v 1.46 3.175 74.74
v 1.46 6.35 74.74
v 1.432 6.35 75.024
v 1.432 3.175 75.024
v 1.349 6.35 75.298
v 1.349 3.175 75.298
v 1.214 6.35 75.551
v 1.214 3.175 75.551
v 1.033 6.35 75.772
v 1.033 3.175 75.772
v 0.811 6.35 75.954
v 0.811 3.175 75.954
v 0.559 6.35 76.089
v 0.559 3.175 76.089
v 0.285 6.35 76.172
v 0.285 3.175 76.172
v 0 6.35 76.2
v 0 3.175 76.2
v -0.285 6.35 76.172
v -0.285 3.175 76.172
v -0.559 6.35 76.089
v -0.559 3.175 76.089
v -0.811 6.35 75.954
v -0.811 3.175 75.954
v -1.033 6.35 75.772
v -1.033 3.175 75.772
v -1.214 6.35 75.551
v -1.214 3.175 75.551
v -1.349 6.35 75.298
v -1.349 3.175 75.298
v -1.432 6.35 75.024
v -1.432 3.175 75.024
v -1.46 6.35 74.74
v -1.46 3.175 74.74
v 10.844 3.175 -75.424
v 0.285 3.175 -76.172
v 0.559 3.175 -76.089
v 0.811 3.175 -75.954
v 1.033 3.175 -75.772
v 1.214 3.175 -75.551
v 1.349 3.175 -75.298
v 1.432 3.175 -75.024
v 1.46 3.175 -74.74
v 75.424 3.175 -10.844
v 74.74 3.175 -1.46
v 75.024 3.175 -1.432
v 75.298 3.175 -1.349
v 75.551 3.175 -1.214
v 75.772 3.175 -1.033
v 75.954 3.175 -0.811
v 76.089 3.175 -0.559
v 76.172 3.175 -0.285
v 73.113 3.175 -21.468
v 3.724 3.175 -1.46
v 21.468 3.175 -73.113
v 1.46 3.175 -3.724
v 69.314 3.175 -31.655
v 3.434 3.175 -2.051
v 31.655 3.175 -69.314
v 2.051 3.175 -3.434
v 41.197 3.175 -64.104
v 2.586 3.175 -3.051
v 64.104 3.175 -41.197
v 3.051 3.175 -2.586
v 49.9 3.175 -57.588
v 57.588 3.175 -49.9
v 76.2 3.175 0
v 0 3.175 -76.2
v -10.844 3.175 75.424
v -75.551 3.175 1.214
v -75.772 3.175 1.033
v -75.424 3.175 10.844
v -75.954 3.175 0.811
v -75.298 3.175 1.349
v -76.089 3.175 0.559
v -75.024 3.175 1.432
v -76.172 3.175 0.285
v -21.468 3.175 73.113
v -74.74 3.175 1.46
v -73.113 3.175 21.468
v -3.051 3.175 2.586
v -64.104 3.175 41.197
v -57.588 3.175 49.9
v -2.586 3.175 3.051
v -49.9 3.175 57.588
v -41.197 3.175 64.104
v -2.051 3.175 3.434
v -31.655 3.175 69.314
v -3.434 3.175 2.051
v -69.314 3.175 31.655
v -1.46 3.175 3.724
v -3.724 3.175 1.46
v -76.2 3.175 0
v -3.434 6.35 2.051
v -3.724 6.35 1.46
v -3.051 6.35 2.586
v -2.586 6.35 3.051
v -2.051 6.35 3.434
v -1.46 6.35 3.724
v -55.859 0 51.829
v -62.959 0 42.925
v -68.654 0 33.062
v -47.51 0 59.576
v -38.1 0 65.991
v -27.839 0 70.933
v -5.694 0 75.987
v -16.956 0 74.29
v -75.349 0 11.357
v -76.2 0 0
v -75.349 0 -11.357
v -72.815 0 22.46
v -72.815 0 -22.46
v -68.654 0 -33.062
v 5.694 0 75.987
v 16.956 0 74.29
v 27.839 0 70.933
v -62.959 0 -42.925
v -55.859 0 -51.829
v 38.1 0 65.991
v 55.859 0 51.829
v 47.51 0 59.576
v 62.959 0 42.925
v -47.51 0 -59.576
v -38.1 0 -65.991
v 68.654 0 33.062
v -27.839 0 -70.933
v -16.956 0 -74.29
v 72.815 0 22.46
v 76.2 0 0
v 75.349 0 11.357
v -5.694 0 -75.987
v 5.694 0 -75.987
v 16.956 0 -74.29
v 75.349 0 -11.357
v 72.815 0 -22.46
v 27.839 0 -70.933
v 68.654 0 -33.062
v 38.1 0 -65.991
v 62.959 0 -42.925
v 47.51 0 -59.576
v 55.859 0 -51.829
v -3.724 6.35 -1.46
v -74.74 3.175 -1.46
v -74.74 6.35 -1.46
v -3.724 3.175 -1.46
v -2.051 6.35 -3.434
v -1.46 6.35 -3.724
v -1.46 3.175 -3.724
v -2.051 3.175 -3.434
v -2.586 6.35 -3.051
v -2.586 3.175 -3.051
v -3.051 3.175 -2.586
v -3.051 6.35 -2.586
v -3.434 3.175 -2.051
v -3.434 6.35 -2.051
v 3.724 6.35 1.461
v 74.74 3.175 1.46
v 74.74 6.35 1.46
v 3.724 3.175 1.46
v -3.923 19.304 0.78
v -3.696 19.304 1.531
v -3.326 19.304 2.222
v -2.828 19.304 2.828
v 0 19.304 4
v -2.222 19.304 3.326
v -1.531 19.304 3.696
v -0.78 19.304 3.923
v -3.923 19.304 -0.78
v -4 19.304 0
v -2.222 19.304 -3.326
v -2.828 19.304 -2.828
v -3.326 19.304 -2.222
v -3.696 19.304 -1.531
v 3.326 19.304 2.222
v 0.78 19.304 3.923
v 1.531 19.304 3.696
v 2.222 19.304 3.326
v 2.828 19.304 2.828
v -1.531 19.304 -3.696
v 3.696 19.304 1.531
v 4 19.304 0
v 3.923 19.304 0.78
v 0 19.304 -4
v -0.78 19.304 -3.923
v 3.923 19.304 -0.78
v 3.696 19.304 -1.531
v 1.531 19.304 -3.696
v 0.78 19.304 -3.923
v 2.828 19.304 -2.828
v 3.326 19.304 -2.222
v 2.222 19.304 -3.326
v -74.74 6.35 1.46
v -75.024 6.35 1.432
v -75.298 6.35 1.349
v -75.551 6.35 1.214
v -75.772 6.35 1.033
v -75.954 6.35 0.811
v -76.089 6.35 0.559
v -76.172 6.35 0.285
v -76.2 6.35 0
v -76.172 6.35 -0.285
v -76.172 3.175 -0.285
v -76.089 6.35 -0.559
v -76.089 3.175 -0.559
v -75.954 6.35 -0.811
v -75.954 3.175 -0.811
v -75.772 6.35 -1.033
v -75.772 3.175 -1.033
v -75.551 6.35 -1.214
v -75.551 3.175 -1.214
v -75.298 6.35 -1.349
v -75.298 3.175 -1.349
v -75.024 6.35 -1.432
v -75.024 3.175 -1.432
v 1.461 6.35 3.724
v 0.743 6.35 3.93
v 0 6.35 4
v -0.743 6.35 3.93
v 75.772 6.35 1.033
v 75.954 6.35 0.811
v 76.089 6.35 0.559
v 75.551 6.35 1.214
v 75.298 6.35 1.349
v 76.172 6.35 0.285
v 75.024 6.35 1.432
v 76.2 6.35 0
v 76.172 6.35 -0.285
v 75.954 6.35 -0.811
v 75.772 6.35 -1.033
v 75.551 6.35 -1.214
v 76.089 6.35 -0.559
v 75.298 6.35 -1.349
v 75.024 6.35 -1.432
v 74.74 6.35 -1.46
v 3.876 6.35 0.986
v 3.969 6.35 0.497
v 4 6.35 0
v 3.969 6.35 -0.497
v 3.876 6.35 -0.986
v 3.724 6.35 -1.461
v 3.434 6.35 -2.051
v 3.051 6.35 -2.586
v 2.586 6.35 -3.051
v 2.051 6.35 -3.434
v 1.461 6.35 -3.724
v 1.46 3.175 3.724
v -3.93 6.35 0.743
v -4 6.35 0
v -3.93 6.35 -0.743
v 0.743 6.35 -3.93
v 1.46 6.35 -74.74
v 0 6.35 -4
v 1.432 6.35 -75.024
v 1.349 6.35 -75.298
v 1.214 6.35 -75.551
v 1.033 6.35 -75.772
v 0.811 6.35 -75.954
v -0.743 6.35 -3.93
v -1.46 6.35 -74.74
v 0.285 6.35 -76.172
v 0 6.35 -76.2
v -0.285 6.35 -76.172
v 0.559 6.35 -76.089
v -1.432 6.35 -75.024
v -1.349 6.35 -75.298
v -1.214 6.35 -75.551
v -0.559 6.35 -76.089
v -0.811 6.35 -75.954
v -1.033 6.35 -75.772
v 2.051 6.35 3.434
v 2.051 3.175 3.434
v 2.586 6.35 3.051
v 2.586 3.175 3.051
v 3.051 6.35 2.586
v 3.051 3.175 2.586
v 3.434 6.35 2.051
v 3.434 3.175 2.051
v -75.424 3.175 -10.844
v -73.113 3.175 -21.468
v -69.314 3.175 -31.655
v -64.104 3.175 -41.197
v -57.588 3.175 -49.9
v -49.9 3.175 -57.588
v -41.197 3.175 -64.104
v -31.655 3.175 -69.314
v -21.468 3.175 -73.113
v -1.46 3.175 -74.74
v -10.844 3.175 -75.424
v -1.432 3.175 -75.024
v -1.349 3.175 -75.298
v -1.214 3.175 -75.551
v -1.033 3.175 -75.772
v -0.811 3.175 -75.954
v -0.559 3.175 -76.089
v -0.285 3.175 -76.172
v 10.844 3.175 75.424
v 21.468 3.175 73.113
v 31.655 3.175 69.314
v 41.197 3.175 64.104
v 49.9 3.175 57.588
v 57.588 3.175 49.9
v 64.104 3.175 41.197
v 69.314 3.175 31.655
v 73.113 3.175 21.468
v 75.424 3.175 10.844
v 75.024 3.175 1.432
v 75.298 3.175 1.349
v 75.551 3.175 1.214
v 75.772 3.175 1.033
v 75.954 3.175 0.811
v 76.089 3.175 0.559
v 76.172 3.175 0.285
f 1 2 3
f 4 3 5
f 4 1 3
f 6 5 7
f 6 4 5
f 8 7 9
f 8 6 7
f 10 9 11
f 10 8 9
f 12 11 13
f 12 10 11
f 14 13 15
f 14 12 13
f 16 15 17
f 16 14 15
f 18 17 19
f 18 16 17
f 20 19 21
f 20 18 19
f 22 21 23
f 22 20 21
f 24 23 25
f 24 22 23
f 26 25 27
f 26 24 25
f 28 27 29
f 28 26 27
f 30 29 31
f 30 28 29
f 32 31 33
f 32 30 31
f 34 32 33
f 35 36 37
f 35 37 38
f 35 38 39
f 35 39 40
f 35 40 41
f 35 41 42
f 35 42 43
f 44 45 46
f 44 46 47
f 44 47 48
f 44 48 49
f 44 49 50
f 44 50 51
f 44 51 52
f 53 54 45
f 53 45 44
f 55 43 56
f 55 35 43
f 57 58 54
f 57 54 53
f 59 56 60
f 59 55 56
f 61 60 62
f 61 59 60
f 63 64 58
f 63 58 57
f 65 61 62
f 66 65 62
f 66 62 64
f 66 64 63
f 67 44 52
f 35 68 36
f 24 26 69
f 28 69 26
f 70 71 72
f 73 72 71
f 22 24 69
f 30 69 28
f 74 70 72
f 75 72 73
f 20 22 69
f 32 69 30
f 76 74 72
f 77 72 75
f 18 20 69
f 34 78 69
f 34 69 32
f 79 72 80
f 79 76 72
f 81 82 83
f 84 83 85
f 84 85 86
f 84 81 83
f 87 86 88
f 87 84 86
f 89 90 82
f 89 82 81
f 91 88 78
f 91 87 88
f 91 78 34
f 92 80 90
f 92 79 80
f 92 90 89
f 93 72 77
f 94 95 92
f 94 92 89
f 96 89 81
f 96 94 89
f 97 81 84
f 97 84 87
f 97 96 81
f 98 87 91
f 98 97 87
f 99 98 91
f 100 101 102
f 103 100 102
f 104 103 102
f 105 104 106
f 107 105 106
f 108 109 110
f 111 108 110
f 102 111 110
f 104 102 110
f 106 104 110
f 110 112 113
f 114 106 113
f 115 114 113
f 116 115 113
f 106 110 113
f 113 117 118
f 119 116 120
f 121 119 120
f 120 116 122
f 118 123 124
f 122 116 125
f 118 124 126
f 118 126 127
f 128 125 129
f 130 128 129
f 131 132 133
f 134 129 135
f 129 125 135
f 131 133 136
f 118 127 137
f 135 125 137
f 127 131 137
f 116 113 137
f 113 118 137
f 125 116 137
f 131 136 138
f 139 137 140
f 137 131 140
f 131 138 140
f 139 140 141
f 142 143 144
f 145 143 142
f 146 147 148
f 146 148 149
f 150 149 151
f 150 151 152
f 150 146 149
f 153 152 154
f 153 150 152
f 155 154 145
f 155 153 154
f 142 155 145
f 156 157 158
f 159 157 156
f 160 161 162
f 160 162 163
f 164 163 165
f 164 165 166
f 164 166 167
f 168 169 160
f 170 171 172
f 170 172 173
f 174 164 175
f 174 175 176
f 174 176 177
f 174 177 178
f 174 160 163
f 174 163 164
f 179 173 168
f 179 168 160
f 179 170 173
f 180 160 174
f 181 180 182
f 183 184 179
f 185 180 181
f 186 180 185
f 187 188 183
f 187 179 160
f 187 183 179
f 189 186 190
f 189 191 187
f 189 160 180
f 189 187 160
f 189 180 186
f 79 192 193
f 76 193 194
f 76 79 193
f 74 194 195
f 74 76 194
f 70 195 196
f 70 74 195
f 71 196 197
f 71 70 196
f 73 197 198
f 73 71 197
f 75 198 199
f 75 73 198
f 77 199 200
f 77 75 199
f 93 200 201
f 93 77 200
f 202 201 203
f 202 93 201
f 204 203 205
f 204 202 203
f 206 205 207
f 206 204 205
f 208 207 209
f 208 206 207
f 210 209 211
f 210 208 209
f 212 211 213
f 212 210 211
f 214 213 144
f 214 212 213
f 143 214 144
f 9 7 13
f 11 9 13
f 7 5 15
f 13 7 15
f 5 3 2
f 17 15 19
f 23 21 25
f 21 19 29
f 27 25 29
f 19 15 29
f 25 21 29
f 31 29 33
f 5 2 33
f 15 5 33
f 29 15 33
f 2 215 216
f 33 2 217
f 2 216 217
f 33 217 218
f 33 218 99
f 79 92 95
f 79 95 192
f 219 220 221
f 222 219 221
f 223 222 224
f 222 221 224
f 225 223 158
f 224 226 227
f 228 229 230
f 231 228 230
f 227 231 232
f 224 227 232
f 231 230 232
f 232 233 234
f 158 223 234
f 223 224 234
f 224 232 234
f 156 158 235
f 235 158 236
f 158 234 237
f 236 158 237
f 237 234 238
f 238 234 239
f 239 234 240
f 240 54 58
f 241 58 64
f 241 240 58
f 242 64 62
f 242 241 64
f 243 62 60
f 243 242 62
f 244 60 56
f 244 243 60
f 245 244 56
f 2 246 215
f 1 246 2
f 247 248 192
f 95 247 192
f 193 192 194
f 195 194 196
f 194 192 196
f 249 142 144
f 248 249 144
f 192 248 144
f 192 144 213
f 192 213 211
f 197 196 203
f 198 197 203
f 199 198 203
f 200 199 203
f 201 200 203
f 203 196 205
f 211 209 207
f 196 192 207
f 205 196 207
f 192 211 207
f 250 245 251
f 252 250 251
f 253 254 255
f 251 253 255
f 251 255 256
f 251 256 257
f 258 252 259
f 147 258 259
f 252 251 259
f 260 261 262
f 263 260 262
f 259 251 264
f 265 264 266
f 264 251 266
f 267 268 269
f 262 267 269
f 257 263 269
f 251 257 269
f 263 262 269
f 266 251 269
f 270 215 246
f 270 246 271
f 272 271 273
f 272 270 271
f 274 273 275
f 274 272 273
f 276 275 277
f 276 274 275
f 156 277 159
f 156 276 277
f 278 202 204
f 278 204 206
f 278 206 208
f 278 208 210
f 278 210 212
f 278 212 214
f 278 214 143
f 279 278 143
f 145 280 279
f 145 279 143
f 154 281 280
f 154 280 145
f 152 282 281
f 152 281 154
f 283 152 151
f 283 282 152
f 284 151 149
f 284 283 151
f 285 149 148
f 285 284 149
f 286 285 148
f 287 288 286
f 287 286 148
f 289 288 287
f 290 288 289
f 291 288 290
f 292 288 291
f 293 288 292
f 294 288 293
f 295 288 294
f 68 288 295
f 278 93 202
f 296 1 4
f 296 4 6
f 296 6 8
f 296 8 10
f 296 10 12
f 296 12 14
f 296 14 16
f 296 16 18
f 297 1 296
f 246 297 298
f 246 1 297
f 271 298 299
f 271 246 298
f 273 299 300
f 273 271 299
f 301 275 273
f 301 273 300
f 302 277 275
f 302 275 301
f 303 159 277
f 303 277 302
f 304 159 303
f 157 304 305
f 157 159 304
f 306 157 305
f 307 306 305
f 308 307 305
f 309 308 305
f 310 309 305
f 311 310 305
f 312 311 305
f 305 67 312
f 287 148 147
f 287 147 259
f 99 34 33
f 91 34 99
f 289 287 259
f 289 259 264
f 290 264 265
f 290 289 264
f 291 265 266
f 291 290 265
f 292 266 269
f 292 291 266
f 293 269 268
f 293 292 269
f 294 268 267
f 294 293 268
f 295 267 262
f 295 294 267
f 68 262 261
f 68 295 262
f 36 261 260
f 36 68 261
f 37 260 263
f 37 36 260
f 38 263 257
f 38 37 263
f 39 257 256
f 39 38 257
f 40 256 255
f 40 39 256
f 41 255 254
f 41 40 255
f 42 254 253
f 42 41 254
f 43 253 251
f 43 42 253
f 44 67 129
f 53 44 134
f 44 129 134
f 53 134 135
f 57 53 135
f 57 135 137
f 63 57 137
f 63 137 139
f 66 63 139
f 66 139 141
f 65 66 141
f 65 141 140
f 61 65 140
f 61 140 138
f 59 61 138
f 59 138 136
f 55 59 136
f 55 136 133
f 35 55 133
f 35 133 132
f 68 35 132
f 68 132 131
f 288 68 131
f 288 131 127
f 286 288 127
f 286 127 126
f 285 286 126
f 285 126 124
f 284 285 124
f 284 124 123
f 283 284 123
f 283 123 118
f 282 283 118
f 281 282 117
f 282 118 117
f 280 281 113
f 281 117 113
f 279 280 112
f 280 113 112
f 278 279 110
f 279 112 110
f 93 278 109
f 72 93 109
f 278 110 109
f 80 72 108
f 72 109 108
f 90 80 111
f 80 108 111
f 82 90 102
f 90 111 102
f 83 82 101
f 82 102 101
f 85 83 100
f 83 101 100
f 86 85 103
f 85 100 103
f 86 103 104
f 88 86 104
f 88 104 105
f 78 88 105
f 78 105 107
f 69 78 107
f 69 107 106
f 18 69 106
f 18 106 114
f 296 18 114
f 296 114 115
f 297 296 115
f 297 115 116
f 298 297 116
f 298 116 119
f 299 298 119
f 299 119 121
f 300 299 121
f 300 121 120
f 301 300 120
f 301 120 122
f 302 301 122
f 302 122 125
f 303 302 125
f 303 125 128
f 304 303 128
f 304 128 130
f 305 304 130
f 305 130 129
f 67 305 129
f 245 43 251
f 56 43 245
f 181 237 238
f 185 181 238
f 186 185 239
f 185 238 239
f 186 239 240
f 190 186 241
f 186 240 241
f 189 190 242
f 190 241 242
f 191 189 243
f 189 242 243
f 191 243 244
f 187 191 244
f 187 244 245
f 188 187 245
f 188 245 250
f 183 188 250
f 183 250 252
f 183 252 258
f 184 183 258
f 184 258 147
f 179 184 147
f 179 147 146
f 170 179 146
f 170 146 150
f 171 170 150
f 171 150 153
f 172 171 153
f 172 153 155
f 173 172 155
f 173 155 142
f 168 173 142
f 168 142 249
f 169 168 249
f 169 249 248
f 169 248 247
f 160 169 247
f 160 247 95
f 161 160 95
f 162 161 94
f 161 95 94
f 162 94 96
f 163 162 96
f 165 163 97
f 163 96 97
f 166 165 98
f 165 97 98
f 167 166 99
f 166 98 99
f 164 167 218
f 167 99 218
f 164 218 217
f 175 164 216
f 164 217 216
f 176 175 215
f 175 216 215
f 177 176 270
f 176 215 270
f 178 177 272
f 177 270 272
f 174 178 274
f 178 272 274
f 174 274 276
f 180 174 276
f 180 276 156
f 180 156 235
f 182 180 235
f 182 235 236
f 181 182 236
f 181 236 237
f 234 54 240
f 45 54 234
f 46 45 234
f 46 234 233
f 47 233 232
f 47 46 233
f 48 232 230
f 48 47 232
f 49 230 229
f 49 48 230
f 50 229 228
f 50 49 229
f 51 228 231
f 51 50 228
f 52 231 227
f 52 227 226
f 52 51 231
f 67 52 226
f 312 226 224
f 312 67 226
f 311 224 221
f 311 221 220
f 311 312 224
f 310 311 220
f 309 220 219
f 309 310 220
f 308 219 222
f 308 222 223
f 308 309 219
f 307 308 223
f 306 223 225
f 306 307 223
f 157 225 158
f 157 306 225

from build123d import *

# Parameters (mm, degrees)
SKETCH1_R                = 76.2
BOSS_EXTRUDE1_DEPTH      = 3.175
BOSS_EXTRUDE2_DEPTH      = 3.175
SKETCH3_R                = 4
BOSS_EXTRUDE3_DEPTH      = 12.954
BOSS_EXTRUDE3_DEPTH_BACK = 6.35


with BuildPart() as part:
    # Sketch1 → Boss-Extrude1 (new body)
    with BuildSketch(Plane(origin=(0, 0, 0), x_dir=(1, 0, 0), z_dir=(0, 1, 0))):
        Circle(SKETCH1_R)
    extrude(amount=BOSS_EXTRUDE1_DEPTH)

    # Sketch2 → Boss-Extrude2 (add)
    with BuildSketch(Plane(origin=(0, 3.175, 0), x_dir=(1, 0, 0), z_dir=(0, 1, 0))):
        with BuildLine():
            Line((-74.7395, 1.4605), (74.7395, 1.4605))
            ThreePointArc((74.7395, 1.4605), (76.2, 0), (74.7395, -1.4605))
            Line((74.7395, -1.4605), (-74.7395, -1.4605))
            ThreePointArc((-74.7395, -1.4605), (-76.2, 0), (-74.7395, 1.4605))
        make_face()
        with BuildLine():
            Line((1.4605, 74.7395), (1.4605, -74.7395))
            ThreePointArc((1.4605, -74.7395), (0, -76.2), (-1.4605, -74.7395))
            Line((-1.4605, -74.7395), (-1.4605, 74.7395))
            ThreePointArc((-1.4605, 74.7395), (0, 76.2), (1.4605, 74.7395))
        make_face()
    extrude(amount=BOSS_EXTRUDE2_DEPTH)

    # Sketch3 → Boss-Extrude3 (add, two sides)
    with BuildSketch(Plane(origin=(0, 6.35, 0), x_dir=(1, 0, 0), z_dir=(0, 1, 0))) as boss_extrude3_sk:
        Circle(SKETCH3_R)
    extrude(amount=BOSS_EXTRUDE3_DEPTH)
    extrude(boss_extrude3_sk.sketch, amount=-BOSS_EXTRUDE3_DEPTH_BACK)


solid = part.part
